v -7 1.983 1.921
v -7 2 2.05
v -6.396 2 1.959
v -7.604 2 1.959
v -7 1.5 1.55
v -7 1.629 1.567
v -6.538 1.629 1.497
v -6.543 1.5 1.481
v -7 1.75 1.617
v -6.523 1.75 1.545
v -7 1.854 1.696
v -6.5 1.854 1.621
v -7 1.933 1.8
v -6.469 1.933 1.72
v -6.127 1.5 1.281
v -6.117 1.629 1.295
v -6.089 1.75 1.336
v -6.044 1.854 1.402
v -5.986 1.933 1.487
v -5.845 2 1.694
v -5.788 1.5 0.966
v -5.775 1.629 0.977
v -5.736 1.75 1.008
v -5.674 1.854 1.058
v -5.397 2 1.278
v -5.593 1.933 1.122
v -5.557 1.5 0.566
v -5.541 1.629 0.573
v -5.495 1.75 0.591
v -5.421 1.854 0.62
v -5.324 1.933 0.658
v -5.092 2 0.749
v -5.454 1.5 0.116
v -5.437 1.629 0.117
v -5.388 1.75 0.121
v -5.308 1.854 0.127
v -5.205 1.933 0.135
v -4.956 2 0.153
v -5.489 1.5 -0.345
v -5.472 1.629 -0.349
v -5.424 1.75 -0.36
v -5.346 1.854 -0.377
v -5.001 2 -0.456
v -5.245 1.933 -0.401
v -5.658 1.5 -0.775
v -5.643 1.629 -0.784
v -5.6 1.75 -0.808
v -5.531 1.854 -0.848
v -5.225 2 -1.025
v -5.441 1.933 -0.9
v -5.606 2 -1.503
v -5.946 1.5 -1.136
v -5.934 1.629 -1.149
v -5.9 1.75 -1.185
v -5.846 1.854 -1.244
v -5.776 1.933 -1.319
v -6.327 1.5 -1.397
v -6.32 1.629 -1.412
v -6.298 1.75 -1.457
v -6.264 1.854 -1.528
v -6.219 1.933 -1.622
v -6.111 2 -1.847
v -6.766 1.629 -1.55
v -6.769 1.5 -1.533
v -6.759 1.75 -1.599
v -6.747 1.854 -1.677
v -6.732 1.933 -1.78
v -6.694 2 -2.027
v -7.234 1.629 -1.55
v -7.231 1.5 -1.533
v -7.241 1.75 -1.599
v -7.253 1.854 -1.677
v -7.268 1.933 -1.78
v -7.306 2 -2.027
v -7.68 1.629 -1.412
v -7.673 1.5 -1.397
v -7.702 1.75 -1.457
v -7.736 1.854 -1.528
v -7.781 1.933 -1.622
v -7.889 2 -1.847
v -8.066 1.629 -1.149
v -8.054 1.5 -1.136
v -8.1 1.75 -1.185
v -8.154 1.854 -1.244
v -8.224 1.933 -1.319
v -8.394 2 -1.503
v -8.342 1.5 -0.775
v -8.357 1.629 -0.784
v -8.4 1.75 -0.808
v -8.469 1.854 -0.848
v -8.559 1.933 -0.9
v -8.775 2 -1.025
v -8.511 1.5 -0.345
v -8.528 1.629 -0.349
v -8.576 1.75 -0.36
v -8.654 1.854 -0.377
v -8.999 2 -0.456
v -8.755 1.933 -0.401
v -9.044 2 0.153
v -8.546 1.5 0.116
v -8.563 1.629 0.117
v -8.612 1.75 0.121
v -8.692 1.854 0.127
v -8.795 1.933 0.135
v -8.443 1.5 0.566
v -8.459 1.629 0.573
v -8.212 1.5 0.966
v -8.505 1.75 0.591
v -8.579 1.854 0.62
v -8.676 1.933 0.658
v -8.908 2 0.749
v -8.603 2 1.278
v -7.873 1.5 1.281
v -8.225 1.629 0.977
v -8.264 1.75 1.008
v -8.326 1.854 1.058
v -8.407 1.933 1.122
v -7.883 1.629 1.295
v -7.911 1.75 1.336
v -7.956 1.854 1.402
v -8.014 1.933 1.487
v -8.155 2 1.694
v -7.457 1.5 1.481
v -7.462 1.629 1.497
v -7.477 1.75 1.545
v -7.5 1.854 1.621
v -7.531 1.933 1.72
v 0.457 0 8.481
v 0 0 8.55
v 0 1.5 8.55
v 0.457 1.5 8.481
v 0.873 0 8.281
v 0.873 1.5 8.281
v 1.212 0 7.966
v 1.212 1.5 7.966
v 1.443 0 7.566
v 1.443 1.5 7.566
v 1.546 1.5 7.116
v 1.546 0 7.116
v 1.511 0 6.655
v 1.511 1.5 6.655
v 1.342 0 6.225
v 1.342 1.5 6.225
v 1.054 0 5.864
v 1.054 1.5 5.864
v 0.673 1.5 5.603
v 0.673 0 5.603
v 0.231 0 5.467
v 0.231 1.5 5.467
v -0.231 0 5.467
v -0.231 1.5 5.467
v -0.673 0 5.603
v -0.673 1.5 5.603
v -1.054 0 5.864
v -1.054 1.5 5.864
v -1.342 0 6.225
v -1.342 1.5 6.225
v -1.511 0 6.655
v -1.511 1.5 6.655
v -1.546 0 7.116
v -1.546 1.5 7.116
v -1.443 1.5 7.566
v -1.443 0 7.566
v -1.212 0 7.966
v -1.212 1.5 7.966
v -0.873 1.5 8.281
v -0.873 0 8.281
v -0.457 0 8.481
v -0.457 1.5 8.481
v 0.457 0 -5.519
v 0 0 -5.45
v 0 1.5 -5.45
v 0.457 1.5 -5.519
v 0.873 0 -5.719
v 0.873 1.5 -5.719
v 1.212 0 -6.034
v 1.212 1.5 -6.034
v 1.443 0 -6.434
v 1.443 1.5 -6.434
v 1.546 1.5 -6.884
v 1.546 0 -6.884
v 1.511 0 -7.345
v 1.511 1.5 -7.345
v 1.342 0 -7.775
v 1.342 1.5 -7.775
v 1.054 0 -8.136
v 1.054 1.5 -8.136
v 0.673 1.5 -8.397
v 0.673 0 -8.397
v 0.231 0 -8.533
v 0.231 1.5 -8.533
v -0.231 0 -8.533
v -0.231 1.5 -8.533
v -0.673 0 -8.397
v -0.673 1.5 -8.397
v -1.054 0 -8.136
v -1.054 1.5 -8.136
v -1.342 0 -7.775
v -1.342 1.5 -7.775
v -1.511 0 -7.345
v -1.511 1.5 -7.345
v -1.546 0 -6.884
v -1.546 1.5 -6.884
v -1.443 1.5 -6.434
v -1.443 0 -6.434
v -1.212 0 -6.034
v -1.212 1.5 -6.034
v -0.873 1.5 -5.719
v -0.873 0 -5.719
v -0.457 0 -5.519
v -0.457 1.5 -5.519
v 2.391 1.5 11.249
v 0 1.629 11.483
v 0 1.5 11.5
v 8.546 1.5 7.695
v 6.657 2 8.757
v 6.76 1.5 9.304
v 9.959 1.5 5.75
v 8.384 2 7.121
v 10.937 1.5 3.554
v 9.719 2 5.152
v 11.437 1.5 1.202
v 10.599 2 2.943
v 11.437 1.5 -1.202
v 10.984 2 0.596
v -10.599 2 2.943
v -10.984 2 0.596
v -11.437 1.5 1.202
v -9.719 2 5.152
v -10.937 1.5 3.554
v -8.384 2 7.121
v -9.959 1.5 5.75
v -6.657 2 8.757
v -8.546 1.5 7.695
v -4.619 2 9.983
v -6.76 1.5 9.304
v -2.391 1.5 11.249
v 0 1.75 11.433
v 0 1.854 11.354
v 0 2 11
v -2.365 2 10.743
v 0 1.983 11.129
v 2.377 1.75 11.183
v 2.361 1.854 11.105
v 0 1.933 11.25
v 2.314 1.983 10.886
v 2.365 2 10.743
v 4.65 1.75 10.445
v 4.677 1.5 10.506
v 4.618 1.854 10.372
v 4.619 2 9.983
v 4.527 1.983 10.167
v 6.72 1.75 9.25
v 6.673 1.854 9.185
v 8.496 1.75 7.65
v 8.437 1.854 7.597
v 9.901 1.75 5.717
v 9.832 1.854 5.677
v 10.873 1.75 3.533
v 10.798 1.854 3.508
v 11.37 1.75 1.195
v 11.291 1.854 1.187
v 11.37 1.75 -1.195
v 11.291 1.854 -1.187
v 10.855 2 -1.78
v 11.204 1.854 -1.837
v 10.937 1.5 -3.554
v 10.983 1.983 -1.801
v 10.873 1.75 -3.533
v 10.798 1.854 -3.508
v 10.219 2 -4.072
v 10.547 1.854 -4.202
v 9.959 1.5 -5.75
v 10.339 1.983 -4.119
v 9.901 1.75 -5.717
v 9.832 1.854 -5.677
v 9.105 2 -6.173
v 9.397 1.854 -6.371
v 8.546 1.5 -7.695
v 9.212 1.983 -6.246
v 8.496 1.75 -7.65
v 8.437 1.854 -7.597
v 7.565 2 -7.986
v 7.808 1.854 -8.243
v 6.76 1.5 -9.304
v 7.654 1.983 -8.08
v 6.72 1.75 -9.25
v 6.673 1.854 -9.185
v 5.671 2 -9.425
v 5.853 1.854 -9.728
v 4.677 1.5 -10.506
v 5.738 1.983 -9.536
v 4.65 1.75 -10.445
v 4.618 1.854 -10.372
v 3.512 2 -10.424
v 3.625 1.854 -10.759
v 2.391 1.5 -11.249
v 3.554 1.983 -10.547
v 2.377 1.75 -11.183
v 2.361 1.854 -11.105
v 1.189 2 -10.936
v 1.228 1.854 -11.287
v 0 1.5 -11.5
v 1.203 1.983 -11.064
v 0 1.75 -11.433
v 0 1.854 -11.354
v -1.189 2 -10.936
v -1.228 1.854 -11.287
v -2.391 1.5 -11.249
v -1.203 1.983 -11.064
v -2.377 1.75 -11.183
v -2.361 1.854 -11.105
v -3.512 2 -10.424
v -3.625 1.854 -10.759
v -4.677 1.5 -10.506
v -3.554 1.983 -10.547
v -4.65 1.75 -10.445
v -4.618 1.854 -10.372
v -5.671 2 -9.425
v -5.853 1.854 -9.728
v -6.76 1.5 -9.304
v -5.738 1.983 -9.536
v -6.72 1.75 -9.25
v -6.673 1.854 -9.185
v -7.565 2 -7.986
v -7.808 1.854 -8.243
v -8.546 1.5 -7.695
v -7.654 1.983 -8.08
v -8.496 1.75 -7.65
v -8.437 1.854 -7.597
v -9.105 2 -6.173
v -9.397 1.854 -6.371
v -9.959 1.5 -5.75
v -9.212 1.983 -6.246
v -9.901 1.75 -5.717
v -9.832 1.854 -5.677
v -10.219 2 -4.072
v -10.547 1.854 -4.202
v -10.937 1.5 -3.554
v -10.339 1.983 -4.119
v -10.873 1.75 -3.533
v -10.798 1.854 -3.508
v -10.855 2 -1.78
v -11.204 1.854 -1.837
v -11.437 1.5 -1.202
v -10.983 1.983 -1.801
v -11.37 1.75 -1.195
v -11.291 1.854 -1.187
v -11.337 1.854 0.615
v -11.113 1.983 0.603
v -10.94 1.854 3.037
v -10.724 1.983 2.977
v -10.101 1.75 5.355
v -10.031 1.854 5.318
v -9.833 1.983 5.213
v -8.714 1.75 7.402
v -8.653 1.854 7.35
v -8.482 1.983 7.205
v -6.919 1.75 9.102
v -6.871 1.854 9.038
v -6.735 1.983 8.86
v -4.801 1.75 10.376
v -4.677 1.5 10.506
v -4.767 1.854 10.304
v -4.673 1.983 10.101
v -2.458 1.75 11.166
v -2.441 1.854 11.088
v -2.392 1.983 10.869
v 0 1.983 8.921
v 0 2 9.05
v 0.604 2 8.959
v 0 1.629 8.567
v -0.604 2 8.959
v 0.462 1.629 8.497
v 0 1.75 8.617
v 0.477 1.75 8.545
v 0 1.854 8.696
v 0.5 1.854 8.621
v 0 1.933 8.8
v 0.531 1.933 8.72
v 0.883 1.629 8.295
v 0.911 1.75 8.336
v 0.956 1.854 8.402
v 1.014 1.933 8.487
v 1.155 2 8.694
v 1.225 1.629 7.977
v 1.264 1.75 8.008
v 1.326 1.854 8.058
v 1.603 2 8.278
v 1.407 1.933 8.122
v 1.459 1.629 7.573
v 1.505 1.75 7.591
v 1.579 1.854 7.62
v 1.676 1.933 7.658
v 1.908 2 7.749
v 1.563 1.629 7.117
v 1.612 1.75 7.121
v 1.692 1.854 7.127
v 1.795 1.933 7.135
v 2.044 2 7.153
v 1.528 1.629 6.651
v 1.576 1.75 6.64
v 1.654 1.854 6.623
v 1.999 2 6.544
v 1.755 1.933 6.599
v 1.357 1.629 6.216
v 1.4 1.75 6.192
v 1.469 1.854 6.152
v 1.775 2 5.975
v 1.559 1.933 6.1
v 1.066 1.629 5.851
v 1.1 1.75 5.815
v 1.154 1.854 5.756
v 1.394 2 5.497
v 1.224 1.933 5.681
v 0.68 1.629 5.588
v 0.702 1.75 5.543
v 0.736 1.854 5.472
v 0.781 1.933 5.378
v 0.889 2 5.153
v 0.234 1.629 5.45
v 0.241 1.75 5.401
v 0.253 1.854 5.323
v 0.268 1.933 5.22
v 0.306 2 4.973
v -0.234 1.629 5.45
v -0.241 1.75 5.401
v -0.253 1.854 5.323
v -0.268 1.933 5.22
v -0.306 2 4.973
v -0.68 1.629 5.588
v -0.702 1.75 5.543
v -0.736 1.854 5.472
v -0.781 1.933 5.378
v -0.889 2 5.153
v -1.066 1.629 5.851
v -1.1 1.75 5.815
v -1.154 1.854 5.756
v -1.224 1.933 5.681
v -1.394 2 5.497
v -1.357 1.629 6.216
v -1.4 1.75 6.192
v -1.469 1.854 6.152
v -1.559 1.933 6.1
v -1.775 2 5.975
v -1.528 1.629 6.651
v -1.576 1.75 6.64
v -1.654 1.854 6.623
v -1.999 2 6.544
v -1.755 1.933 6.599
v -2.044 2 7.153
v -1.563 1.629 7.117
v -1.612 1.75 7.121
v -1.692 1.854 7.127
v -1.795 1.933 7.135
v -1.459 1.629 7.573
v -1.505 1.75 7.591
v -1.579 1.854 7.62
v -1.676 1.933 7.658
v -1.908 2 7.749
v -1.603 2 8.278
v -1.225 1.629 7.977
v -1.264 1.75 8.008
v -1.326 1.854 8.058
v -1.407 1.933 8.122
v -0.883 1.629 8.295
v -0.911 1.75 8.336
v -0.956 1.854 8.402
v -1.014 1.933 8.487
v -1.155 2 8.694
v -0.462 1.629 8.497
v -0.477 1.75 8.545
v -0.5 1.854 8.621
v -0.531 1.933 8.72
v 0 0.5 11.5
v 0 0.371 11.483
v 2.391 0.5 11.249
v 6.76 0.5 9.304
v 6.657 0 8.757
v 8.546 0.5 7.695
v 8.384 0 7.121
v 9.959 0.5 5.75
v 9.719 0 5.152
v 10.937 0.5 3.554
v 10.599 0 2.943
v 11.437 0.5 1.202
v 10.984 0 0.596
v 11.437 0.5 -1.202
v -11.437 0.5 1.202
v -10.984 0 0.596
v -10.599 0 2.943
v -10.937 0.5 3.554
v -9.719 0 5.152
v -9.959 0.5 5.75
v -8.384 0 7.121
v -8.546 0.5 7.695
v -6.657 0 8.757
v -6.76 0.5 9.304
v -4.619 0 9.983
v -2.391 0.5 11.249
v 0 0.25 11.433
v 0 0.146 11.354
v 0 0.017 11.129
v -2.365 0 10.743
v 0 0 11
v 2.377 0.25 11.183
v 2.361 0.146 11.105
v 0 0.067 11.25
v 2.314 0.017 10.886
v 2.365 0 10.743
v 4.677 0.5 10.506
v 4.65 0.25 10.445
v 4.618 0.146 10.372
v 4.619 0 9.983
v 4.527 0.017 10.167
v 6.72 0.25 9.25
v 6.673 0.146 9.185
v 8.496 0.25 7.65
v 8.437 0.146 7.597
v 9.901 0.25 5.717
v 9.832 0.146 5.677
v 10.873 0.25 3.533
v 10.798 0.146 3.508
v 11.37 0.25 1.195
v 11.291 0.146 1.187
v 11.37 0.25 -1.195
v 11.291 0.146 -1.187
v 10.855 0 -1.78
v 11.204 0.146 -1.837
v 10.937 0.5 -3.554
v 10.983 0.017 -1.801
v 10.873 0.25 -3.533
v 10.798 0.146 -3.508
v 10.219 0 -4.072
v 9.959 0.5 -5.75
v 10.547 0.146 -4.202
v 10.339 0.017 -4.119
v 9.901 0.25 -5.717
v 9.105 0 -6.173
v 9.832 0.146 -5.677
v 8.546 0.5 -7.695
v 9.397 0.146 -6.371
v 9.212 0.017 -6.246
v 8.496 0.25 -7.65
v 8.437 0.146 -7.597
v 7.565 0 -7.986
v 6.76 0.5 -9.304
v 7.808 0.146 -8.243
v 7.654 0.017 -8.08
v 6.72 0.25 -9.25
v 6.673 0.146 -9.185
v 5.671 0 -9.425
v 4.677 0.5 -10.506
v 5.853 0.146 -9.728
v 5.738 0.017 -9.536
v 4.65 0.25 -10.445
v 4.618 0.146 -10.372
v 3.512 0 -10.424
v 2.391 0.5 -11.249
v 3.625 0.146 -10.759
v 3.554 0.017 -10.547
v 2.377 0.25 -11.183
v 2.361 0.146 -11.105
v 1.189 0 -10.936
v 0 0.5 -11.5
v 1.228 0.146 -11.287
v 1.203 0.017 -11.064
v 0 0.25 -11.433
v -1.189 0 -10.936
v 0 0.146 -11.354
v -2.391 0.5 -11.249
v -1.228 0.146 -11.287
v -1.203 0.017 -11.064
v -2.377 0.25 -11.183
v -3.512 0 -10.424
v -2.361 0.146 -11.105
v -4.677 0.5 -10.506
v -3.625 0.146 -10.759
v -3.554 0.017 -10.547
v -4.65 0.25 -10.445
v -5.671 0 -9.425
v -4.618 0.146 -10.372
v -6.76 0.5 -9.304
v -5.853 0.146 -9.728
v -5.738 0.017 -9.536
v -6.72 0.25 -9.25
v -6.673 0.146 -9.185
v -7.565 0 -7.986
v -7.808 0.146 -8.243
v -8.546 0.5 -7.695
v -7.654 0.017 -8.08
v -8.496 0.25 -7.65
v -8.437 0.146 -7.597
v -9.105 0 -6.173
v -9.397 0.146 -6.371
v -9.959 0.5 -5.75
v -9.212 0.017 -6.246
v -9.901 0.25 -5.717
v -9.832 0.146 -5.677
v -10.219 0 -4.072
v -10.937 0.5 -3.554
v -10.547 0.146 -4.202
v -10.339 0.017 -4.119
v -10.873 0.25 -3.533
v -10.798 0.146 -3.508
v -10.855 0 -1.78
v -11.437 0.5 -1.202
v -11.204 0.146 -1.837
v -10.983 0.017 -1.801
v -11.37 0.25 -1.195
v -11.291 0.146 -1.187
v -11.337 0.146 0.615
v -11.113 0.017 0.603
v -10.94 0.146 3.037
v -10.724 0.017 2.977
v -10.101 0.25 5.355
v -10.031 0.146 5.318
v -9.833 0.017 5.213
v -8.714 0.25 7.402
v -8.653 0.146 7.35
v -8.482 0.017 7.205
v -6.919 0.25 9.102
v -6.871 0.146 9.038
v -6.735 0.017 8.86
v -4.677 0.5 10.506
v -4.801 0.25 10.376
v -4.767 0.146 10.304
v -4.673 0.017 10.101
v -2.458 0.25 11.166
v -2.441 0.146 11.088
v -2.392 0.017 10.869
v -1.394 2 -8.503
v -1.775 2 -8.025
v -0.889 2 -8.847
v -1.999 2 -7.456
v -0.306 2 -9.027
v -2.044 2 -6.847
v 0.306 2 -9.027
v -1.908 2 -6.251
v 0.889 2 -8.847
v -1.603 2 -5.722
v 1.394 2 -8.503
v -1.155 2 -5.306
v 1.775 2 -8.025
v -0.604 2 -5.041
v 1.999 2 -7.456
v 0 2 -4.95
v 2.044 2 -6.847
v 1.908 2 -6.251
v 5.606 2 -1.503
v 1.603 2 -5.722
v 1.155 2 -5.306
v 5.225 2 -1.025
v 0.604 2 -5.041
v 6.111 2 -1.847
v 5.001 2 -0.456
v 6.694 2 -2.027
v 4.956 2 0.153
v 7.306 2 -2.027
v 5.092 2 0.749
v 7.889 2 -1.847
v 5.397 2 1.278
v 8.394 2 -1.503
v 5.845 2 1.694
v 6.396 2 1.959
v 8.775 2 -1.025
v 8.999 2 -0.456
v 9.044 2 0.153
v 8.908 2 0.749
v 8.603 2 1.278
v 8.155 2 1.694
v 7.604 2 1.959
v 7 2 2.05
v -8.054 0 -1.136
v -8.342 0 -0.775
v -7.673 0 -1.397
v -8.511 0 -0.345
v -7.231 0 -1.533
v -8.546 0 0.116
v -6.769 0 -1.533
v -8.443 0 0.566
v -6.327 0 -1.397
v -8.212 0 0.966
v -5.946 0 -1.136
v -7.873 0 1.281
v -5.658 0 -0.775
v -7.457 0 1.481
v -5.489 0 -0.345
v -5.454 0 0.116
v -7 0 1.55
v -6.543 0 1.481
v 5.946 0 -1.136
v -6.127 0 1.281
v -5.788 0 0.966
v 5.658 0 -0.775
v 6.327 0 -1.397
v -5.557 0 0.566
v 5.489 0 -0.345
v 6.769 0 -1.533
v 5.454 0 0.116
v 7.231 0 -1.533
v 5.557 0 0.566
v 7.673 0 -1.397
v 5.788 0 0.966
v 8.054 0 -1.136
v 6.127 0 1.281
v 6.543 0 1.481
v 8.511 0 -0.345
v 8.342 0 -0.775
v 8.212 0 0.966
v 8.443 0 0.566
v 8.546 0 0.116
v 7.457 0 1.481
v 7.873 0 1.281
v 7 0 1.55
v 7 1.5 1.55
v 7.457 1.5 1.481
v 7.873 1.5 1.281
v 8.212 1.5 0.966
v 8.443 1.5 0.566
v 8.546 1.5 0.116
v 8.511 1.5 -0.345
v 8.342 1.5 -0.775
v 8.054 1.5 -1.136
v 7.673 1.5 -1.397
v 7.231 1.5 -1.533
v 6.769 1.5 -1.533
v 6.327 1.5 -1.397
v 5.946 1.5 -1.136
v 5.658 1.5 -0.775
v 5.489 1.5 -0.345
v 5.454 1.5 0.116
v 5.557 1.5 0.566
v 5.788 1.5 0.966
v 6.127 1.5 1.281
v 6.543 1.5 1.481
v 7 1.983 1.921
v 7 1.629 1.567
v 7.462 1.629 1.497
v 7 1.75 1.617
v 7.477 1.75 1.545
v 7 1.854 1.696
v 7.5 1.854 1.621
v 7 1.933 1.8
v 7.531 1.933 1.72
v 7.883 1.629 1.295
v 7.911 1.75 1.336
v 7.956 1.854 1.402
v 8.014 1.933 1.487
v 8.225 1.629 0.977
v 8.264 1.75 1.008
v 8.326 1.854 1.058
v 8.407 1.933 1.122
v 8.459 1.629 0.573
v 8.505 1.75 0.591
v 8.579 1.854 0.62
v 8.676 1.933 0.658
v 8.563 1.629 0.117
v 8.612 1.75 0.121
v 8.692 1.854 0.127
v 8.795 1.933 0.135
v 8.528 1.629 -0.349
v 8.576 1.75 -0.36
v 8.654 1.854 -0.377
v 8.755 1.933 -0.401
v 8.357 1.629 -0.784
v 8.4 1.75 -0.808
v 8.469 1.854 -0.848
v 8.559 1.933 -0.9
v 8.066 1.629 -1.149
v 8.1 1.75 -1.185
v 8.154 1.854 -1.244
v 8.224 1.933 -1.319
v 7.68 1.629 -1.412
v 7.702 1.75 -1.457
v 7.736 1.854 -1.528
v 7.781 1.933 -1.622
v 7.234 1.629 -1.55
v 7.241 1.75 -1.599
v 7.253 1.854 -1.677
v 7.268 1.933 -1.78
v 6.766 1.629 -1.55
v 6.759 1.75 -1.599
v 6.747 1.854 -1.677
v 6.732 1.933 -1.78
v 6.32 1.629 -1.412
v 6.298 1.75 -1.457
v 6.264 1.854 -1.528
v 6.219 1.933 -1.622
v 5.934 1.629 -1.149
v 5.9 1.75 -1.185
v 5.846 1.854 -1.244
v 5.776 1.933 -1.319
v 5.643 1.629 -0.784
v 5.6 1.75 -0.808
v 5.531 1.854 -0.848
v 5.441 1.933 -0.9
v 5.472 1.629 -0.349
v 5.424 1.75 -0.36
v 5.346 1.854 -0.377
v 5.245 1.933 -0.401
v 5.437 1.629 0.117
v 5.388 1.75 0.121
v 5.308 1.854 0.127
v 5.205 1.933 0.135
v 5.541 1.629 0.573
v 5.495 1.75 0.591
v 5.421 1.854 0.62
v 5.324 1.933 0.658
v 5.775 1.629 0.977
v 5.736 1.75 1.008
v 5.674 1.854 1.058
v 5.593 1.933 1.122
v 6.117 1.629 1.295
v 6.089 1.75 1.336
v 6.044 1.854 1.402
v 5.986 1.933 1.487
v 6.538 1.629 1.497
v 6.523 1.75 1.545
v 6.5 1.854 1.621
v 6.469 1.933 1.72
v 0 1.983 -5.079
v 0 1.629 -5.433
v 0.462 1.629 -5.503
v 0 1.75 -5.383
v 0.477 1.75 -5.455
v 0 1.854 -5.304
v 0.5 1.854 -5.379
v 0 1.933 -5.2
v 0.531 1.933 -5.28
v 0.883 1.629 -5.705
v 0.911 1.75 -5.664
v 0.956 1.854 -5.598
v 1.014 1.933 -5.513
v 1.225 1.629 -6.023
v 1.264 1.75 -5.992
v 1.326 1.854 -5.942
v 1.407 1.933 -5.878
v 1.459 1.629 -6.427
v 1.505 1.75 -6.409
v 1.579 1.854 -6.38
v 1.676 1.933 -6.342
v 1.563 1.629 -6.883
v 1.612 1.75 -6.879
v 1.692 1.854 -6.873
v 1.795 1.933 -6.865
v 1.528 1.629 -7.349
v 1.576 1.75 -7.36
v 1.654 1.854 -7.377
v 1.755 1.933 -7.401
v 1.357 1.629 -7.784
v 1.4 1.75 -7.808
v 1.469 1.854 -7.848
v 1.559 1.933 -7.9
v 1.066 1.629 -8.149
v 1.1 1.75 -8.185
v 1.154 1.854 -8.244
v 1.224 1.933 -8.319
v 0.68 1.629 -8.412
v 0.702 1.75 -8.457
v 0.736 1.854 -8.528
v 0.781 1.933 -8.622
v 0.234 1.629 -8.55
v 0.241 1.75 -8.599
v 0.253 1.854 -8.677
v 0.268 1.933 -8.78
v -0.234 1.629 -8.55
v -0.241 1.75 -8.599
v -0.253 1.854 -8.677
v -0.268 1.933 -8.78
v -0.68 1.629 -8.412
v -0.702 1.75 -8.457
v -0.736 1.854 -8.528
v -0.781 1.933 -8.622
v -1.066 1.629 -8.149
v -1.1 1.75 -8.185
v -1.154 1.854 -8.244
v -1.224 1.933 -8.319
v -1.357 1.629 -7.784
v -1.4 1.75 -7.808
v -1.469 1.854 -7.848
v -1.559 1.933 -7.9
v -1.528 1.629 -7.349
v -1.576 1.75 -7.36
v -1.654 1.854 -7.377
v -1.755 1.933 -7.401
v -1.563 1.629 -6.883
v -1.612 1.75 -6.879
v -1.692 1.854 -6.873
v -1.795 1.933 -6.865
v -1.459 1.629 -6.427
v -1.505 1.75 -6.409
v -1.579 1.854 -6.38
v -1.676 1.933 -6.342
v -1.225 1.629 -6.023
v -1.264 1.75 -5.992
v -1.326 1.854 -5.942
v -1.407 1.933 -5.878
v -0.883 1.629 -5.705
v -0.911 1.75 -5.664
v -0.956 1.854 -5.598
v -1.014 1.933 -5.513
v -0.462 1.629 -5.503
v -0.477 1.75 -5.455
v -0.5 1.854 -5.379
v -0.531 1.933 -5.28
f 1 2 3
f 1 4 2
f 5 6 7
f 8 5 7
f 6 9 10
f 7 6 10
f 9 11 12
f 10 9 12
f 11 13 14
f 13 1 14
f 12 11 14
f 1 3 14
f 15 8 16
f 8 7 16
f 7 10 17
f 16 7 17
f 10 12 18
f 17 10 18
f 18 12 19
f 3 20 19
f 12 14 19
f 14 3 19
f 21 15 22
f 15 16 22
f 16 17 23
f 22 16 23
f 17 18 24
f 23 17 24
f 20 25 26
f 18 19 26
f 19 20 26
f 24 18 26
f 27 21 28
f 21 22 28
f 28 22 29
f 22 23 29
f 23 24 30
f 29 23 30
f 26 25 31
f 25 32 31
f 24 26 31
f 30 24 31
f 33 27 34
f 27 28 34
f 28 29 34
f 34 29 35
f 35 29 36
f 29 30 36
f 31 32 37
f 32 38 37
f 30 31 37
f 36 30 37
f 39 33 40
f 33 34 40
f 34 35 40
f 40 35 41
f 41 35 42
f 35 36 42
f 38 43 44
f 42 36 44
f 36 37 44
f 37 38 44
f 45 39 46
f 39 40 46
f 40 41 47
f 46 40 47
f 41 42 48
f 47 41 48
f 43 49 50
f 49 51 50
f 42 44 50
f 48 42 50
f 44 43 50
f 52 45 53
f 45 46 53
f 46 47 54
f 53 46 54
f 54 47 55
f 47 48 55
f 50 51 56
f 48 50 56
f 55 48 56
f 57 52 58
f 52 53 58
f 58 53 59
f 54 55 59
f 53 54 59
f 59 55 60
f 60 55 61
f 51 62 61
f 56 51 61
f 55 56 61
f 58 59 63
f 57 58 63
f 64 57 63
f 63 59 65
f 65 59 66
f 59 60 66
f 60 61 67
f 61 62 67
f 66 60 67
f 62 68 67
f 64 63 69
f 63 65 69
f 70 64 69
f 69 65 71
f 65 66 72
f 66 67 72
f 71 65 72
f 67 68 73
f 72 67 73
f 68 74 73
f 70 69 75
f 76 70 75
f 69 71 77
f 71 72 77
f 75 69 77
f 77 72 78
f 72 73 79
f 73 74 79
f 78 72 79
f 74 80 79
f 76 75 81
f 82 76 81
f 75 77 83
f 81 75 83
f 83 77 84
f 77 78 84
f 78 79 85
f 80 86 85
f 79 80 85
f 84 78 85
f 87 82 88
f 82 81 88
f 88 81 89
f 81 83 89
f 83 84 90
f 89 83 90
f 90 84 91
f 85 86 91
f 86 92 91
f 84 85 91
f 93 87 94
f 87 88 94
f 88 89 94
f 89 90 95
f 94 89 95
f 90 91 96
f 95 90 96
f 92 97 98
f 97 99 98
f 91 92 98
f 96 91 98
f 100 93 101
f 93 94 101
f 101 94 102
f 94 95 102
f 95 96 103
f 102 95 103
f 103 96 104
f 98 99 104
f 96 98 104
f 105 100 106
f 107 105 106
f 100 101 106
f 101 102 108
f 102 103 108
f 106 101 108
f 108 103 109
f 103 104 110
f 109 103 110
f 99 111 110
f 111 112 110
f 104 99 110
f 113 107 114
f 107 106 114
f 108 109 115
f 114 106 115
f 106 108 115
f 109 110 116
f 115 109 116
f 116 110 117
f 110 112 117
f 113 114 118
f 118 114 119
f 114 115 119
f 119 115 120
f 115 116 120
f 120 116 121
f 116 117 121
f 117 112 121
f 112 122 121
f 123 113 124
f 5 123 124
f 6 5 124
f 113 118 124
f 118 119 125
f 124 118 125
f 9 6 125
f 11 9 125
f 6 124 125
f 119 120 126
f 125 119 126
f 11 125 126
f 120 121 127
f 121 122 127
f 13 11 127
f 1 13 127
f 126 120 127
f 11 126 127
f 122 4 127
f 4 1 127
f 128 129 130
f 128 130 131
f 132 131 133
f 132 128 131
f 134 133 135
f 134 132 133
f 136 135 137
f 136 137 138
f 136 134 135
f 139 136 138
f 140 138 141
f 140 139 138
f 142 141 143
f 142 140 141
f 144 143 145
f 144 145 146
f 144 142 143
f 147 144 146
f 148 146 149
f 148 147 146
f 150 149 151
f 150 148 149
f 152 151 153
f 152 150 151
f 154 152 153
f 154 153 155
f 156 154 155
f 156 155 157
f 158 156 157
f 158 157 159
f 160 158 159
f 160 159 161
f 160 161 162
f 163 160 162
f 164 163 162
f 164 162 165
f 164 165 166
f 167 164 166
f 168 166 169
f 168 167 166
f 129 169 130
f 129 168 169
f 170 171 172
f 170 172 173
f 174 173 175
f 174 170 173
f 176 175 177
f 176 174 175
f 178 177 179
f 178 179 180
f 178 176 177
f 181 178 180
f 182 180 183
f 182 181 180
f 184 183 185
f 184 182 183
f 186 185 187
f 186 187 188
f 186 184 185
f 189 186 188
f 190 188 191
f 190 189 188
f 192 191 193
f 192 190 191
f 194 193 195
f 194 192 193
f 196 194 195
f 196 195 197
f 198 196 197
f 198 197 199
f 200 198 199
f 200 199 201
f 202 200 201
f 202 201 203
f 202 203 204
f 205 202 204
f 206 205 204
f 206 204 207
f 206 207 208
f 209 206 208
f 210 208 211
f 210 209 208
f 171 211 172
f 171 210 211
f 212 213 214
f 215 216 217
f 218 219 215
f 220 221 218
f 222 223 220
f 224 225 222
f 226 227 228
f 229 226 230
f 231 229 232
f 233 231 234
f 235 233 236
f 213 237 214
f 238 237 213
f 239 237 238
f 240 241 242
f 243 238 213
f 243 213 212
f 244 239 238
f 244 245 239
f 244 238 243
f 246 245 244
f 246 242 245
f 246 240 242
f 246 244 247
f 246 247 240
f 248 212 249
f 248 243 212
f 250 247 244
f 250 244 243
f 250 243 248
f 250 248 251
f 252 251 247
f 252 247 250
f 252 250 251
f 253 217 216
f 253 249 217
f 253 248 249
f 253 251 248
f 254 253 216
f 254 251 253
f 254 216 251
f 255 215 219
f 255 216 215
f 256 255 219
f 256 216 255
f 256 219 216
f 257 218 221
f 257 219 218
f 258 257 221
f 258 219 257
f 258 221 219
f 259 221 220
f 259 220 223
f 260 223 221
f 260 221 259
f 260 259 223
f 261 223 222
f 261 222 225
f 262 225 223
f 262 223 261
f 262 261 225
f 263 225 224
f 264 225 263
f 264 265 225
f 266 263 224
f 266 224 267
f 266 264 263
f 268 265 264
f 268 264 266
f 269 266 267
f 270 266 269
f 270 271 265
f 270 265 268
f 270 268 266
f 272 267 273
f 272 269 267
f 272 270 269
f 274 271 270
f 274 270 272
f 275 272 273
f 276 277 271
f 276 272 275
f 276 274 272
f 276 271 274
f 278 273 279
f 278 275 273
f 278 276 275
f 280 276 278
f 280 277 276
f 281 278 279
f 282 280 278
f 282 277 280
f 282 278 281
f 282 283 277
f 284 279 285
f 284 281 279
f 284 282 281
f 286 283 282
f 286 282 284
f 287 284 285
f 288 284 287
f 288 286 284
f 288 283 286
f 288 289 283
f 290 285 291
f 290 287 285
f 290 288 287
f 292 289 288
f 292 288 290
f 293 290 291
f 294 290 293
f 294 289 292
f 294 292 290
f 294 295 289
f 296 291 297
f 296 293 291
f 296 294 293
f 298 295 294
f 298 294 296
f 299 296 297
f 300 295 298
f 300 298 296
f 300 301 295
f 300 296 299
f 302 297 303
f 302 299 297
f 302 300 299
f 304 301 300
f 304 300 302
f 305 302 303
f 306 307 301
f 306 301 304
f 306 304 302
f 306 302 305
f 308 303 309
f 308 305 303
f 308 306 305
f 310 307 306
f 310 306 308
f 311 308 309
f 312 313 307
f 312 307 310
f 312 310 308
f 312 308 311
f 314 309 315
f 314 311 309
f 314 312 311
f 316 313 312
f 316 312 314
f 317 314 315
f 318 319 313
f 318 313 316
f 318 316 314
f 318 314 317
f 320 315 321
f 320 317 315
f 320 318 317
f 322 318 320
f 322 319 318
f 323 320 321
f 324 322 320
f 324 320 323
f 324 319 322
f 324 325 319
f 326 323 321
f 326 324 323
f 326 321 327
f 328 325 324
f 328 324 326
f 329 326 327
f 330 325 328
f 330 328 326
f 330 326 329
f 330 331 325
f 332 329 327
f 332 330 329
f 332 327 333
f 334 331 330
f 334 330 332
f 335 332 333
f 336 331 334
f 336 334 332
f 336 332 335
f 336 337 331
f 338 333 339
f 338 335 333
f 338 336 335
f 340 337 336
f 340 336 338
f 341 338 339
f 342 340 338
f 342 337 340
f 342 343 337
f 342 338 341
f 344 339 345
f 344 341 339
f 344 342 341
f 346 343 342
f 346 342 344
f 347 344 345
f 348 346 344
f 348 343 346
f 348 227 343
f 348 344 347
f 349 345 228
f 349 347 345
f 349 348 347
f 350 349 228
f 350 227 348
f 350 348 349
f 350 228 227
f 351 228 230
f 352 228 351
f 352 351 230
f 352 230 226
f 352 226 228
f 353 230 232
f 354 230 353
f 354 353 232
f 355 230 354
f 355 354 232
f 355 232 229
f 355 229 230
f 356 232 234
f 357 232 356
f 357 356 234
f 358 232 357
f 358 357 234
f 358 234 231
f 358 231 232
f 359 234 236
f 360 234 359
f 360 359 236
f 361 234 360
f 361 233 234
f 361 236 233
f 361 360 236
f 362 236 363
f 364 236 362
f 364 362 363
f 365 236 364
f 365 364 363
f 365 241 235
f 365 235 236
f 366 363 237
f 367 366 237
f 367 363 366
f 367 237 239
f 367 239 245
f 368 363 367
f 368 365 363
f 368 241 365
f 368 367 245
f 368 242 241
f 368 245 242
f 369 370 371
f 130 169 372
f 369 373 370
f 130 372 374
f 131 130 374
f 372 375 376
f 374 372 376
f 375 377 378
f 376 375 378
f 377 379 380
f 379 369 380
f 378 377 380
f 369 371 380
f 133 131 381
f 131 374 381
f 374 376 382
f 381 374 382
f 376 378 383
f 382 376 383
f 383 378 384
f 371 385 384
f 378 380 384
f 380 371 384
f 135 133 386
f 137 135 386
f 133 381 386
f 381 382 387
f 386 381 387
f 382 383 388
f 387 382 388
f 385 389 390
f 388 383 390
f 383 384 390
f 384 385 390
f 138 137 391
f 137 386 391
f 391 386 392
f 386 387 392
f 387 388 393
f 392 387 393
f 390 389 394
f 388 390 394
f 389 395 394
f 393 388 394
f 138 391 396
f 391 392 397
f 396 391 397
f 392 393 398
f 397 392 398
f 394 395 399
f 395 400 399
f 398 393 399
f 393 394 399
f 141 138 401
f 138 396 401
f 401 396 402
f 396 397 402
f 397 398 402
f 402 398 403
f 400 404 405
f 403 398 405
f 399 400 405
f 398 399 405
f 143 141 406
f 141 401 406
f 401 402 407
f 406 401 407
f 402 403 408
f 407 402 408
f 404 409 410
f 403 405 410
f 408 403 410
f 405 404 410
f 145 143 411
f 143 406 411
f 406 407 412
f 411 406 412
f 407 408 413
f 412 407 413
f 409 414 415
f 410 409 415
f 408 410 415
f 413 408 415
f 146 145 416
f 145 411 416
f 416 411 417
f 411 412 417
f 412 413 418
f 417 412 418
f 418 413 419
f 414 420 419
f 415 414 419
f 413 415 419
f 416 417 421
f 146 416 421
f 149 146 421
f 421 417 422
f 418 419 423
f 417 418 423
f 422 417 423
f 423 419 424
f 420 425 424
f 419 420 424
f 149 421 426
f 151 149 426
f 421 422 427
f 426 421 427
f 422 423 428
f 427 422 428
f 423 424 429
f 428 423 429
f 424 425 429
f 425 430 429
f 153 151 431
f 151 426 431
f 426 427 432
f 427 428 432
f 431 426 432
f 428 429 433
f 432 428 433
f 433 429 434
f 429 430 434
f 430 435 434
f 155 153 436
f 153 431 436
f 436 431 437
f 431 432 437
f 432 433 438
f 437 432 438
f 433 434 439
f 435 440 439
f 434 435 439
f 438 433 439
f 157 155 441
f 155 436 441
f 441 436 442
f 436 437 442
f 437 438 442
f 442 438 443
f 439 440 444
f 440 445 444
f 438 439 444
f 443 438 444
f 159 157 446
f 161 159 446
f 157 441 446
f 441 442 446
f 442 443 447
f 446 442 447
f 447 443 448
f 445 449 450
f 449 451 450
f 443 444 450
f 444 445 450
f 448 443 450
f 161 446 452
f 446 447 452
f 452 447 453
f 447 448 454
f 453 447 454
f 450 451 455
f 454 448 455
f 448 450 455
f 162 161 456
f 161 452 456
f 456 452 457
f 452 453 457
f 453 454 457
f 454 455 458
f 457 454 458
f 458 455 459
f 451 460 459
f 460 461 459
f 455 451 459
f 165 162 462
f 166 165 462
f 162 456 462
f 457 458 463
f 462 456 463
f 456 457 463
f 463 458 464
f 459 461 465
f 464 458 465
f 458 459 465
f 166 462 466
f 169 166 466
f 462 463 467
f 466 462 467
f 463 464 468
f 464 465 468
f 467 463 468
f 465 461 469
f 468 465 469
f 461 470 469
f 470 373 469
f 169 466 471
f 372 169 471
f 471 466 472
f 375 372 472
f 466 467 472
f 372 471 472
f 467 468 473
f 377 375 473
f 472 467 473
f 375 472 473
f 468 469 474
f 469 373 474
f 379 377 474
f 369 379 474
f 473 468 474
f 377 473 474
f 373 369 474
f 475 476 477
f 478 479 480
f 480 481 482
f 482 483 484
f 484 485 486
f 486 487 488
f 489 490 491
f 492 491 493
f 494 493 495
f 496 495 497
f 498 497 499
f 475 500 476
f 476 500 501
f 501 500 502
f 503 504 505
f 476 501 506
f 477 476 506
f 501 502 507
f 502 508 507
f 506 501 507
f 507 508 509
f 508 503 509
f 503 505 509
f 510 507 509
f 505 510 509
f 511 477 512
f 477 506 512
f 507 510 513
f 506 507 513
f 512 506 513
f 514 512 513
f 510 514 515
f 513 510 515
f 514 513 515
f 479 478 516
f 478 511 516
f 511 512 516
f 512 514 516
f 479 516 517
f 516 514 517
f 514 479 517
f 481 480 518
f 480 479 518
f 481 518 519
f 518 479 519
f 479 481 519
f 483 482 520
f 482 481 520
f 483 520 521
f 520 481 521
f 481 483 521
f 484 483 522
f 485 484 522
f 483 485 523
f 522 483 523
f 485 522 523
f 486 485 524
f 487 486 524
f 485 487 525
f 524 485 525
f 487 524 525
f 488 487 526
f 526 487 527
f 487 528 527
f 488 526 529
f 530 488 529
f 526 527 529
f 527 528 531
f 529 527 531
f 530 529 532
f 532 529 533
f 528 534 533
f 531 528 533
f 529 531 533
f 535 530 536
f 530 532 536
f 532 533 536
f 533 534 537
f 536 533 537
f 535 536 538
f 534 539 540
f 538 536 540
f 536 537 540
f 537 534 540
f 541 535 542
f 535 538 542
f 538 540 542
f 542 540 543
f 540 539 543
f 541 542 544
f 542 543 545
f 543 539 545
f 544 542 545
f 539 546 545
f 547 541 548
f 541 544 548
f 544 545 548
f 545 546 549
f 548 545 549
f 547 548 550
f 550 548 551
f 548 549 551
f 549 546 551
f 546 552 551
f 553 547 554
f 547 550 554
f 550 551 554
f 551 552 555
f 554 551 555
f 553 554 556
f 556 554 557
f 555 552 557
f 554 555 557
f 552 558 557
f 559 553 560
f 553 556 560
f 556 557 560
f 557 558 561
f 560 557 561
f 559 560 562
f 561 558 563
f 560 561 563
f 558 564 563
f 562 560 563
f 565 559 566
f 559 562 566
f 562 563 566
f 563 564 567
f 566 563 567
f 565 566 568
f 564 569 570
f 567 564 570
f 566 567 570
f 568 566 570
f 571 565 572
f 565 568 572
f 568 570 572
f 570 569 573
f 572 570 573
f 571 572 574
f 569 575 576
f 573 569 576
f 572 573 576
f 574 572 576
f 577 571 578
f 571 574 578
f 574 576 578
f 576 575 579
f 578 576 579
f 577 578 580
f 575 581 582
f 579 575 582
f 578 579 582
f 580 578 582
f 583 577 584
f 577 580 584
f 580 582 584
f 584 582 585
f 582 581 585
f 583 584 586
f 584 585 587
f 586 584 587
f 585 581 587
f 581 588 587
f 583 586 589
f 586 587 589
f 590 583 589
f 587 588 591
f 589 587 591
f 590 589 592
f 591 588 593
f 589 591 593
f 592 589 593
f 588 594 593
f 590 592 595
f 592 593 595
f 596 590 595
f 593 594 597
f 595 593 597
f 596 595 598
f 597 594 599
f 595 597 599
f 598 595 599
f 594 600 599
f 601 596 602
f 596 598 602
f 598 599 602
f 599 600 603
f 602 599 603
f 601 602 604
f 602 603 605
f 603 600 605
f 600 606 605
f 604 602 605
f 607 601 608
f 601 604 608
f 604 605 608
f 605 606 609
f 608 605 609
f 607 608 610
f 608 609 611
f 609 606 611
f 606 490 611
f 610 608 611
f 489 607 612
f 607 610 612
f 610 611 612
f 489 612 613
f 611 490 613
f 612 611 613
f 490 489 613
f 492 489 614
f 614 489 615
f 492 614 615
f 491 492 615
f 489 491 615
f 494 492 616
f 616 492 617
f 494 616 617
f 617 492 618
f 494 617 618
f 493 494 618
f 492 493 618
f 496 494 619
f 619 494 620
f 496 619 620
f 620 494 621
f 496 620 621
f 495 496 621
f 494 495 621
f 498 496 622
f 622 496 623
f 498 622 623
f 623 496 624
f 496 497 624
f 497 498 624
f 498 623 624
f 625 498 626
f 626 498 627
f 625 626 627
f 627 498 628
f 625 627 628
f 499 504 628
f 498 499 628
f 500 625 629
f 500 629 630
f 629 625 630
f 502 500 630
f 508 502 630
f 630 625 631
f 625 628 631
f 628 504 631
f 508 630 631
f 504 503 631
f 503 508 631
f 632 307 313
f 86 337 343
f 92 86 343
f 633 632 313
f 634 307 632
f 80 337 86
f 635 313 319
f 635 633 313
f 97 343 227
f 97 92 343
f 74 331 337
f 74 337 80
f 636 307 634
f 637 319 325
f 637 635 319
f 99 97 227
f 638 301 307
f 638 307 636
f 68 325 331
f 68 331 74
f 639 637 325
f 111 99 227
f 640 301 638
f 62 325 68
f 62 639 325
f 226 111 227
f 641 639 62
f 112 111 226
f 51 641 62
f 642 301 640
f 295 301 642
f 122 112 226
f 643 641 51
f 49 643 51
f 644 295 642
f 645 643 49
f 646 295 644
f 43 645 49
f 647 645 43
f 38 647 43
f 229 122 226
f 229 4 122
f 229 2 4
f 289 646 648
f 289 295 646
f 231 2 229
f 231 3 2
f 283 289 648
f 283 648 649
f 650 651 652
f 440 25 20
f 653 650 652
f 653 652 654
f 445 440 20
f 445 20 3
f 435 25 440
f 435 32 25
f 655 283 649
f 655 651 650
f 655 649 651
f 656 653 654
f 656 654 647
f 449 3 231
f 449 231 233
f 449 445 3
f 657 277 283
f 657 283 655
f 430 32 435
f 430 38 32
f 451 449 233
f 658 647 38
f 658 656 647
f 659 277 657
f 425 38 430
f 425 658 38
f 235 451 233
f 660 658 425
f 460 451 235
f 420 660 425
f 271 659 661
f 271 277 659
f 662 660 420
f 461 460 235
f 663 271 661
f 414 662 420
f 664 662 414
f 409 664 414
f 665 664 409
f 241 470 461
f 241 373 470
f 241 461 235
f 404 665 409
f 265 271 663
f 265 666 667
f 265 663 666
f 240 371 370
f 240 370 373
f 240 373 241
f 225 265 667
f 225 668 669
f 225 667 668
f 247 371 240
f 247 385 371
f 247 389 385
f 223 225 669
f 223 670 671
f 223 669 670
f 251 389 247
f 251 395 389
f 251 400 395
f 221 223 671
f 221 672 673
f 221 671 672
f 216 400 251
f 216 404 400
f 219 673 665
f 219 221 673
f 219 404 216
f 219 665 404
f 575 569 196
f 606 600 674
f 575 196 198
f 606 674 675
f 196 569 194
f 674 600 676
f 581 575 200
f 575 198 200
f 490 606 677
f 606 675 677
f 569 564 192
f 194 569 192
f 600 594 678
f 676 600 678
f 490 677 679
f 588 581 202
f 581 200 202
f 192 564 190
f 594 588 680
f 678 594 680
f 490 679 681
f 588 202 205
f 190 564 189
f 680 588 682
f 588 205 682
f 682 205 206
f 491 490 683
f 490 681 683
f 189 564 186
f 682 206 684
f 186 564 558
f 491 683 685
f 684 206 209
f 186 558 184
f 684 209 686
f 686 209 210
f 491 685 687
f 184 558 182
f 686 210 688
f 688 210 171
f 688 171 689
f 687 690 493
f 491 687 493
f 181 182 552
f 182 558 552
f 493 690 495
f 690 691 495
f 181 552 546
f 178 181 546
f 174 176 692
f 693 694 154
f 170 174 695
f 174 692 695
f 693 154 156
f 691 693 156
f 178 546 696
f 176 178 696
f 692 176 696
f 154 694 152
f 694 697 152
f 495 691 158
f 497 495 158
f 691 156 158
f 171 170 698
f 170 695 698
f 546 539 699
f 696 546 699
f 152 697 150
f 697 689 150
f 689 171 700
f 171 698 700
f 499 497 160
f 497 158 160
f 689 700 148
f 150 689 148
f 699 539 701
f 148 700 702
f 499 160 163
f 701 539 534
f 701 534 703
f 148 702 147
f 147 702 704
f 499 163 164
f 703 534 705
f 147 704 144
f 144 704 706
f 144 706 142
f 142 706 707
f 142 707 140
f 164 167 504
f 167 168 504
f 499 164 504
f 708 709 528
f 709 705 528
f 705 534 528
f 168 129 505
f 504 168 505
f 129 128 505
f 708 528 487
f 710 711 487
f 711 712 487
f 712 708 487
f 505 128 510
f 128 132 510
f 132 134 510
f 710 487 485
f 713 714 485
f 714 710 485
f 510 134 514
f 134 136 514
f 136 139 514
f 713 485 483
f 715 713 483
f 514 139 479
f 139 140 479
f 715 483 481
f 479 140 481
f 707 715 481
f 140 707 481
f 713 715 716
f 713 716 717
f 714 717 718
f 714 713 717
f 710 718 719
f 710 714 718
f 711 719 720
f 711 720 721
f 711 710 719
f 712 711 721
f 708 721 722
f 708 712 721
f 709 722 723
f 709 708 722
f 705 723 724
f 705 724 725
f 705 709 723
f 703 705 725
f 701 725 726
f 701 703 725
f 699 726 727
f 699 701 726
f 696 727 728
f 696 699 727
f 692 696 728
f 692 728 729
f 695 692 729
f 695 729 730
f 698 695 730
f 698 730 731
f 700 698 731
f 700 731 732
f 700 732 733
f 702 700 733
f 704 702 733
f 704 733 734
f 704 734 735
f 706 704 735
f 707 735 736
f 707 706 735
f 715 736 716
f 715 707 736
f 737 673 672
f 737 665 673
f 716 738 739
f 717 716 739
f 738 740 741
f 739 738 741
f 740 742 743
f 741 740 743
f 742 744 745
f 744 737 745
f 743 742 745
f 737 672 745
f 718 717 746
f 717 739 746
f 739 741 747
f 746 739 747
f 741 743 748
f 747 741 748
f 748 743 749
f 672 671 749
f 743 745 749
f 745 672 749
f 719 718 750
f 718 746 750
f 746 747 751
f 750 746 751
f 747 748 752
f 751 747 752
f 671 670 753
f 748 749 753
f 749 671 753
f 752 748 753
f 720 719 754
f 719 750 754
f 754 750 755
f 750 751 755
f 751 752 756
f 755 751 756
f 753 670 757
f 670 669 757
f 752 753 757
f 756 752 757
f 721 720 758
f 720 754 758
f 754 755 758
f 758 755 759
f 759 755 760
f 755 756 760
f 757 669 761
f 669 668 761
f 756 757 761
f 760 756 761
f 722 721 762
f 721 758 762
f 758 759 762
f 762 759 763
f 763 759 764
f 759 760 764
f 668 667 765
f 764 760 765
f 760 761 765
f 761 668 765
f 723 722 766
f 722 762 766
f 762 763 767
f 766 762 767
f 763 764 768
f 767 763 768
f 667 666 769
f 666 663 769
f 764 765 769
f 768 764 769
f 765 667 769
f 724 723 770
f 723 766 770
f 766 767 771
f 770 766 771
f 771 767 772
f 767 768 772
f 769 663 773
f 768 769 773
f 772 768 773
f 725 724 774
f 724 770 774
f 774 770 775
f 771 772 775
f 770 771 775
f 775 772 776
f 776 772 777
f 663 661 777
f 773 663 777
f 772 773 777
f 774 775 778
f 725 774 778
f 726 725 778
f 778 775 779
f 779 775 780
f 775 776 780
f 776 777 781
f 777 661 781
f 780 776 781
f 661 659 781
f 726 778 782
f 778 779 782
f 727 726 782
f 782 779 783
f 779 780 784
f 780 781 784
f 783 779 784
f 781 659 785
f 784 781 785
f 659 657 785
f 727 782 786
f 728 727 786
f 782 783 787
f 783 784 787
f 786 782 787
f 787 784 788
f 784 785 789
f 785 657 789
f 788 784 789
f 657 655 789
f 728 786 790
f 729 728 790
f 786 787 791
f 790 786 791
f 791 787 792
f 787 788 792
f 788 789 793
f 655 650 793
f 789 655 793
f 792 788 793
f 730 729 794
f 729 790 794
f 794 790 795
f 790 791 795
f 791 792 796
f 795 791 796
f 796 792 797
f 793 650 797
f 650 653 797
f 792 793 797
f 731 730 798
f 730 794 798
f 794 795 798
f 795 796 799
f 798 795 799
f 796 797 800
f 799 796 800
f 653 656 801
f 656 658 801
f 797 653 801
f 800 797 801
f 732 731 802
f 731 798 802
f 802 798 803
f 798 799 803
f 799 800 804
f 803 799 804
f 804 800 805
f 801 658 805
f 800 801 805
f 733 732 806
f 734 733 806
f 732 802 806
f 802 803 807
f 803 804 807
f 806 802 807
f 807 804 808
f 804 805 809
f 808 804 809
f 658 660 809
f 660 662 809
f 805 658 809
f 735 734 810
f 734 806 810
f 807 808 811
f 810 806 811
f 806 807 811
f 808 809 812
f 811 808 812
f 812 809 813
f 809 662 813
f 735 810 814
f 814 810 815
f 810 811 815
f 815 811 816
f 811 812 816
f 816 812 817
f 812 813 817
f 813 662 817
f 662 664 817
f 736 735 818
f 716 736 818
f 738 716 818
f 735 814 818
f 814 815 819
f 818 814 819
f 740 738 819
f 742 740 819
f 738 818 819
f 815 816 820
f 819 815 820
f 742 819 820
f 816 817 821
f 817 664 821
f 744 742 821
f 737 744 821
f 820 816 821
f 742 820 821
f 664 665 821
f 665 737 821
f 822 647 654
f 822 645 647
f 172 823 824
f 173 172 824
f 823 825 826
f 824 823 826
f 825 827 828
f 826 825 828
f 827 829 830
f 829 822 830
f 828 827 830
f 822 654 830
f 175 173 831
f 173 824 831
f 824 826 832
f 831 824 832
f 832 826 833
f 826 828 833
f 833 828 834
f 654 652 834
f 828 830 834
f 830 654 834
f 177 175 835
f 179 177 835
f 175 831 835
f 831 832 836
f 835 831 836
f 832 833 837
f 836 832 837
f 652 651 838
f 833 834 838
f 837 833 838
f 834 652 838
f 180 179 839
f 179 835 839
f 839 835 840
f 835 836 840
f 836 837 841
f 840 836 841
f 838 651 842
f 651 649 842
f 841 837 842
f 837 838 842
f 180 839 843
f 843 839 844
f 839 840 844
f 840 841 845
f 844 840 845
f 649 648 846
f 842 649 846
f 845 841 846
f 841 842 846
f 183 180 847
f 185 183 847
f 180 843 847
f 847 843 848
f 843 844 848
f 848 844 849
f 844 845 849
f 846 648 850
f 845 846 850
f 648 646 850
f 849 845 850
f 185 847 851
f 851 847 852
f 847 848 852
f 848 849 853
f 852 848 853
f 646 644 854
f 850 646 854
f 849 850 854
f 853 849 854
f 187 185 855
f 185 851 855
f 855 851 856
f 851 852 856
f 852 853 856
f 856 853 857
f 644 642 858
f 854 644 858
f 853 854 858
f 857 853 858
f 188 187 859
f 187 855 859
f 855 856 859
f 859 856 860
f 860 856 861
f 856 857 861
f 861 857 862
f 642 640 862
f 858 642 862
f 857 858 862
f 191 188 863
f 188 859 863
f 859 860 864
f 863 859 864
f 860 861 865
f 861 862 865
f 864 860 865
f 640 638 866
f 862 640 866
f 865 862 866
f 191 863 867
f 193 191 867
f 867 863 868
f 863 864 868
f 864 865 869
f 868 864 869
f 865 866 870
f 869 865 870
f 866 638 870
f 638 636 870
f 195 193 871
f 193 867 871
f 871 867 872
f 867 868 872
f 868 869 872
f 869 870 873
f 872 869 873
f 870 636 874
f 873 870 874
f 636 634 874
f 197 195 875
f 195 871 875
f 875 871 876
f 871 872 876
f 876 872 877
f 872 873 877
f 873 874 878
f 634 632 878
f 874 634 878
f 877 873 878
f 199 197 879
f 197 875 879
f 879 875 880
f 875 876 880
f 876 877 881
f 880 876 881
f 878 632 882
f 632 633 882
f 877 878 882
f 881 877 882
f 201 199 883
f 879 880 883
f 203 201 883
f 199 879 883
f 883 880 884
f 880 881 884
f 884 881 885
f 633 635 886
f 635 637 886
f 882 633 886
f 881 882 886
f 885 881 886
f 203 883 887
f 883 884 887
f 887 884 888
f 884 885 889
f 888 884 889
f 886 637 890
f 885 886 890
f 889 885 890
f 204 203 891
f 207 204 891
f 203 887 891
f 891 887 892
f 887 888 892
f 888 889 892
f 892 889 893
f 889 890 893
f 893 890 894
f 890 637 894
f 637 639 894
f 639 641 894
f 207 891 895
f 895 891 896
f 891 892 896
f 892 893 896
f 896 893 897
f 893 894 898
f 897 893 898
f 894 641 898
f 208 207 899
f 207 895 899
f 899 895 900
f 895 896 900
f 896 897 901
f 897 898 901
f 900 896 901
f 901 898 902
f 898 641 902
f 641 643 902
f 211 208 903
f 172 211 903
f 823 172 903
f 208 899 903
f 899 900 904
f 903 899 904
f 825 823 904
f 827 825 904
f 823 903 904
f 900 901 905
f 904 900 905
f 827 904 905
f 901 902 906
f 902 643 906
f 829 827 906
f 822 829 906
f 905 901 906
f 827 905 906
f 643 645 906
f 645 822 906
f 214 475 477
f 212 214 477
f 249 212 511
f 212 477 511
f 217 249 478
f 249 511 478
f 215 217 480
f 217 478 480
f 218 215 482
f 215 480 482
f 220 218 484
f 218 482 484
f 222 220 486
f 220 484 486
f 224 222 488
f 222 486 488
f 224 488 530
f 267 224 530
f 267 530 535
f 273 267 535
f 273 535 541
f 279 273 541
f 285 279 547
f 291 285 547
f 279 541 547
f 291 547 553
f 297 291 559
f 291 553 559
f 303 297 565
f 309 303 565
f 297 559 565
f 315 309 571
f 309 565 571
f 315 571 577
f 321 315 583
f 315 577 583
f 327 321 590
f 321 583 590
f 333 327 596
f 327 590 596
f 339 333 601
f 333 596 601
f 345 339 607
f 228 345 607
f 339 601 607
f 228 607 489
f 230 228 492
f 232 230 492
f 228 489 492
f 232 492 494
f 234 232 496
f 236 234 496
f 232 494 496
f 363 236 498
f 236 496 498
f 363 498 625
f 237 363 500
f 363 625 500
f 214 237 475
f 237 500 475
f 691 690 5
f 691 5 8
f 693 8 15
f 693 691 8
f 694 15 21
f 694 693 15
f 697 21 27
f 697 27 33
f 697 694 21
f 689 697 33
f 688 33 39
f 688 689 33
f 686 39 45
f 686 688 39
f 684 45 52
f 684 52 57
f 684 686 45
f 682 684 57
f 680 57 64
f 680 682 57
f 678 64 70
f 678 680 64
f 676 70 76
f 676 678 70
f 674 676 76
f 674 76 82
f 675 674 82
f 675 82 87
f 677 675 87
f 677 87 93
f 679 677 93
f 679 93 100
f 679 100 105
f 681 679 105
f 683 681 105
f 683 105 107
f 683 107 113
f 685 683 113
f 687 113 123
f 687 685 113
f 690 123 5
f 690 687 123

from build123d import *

# Parameters (mm, degrees)
SKETCH1_R           = 11.5
SKETCH1_R_2         = 1.55
BOSS_EXTRUDE1_DEPTH = 2
FILLET1_R           = 0.5


with BuildPart() as part:
    # Sketch1 → Boss-Extrude1 (new body)
    with BuildSketch(Plane(origin=(0, 0, 0), x_dir=(1, 0, 0), z_dir=(0, 1, 0))):
        with Locations(Location((0, 0, 0), (0, 0, 270))):
            Circle(SKETCH1_R)
        with Locations(Location((0, 7, 0), (0, 0, 270))):
            Circle(SKETCH1_R_2, mode=Mode.SUBTRACT)
        with Locations(Location((7, 0, 0), (0, 0, 270))):
            Circle(SKETCH1_R_2, mode=Mode.SUBTRACT)
        with Locations(Location((0, -7, 0), (0, 0, 270))):
            Circle(SKETCH1_R_2, mode=Mode.SUBTRACT)
        with Locations(Location((-7, 0, 0), (0, 0, 270))):
            Circle(SKETCH1_R_2, mode=Mode.SUBTRACT)
    extrude(amount=BOSS_EXTRUDE1_DEPTH)

    # Fillet1
    fillet1_edges = [part.edges().sort_by_distance(p)[0] for p in [
        (0, 2, 5.45),
        (-7, 2, -1.55),
        (0, 0, -11.5),
        (0, 2, -11.5),
        (0, 2, -8.55),
        (7, 2, -1.55),
    ]]
    fillet(fillet1_edges, radius=FILLET1_R)


solid = part.part
